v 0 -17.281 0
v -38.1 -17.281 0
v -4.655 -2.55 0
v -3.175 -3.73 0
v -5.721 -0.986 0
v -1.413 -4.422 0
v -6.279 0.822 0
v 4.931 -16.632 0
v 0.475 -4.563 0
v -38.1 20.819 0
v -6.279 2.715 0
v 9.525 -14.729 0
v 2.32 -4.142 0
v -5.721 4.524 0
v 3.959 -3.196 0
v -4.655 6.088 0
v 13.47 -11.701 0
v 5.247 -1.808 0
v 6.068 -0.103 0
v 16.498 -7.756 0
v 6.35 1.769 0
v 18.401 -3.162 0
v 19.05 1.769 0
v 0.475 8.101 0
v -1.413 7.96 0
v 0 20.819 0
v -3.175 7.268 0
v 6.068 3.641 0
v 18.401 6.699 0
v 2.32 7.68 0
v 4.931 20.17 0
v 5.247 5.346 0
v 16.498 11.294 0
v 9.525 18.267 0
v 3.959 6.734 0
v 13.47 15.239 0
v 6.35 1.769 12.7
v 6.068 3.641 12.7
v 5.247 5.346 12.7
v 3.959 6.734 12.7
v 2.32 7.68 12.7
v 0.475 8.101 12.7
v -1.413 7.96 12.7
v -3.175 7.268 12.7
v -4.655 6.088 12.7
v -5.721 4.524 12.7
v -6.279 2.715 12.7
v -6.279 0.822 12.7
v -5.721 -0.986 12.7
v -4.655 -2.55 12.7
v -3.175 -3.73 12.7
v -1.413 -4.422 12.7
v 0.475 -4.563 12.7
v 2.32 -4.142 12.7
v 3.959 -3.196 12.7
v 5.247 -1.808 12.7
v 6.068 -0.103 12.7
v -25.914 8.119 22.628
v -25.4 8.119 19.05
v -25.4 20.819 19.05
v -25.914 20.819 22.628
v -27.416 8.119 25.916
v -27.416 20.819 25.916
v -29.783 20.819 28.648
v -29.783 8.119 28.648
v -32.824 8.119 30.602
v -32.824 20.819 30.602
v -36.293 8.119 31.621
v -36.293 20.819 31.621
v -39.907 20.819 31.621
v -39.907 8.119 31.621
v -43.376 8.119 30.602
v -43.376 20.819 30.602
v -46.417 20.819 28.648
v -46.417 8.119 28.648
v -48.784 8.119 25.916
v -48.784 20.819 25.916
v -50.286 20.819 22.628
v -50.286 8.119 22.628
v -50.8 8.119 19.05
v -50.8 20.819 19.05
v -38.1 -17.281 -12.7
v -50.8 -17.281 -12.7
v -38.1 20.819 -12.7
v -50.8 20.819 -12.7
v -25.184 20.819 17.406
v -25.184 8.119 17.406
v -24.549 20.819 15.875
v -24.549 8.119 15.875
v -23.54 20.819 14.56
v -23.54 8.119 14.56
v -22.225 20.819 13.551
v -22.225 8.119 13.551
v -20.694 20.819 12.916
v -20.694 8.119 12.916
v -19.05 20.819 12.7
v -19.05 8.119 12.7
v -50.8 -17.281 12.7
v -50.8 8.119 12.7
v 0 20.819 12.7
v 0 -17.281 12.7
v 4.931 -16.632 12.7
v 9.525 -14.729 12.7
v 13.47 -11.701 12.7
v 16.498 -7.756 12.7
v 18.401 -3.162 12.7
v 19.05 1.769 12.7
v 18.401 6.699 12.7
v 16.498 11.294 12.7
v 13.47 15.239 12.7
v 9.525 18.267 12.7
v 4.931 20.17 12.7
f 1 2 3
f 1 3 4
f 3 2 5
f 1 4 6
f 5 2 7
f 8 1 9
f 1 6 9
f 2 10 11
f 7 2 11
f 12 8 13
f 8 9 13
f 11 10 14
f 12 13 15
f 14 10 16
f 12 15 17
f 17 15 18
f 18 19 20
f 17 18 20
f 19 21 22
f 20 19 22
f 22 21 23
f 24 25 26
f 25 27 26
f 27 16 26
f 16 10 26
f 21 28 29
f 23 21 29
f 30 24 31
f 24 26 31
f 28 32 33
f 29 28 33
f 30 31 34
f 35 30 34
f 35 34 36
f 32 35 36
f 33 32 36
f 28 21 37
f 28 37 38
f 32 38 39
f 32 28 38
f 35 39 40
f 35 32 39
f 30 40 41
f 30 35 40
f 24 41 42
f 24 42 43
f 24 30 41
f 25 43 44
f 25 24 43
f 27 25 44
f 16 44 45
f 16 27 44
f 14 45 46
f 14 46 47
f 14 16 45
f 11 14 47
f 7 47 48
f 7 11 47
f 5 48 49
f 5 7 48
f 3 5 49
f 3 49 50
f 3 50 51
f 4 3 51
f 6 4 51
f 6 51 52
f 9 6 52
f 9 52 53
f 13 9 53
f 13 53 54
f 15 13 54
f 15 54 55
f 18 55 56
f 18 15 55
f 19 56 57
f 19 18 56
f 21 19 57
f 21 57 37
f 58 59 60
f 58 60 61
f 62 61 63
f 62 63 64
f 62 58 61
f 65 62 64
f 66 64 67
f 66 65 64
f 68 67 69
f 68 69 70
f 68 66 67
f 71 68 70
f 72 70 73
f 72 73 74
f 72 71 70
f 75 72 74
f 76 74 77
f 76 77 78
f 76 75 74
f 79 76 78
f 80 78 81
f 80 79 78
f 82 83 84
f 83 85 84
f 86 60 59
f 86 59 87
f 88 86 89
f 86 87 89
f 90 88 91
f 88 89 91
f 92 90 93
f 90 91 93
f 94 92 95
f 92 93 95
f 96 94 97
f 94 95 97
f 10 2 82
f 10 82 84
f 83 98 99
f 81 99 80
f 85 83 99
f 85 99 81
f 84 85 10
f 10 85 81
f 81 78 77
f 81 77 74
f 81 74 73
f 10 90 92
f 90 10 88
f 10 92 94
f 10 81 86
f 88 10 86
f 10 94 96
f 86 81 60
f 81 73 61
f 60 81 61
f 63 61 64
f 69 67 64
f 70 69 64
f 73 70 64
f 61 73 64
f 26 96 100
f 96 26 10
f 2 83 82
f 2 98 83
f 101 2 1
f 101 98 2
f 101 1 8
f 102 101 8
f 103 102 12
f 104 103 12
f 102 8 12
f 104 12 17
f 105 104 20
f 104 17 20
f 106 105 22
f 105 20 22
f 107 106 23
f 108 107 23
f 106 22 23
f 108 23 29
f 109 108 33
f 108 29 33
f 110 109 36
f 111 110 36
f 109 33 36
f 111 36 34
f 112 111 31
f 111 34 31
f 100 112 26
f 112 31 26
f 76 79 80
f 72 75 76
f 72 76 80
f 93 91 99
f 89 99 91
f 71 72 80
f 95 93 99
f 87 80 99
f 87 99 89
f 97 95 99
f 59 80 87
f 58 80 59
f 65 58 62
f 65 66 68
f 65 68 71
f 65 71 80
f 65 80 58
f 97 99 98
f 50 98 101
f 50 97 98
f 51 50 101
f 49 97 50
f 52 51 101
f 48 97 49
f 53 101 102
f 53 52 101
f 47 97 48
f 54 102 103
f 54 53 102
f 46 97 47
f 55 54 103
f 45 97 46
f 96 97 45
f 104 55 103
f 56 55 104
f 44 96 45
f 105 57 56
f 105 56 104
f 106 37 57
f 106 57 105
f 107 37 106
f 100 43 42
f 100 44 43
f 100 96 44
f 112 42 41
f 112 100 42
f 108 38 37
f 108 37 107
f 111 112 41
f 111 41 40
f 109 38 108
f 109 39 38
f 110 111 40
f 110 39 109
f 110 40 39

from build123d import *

# Parameters (mm, degrees)
F0_R     = 6.35
F0_W     = 12.7
F0_H     = 25.4
F0_H_2   = 12.7
F1_DEPTH = 12.7
F2_DEPTH = 12.7
F3_DEPTH = 19.05
F4_DEPTH = 12.7
F6_DEPTH = 12.7
F7_R     = 6.34999


# Not quite as in the source:
# - a fillet or chamfer is up to 0.001 mm smaller than in the source, because OpenCascade refuses the exact size


with BuildPart() as f1:
    # F0 (on Top) → F1 (new body)
    with BuildSketch(Plane.XY):
        with BuildLine():
            ThreePointArc((0, -17.2810847643), (19.05, 1.7689152357), (0, 20.8189152357))
            Line((0, 20.8189152357), (-25.4, 20.8189152357))
            Line((-25.4, 20.8189152357), (-25.4, 8.1189152357))
            Line((-25.4, 8.1189152357), (-38.1, 8.1189152357))
            Line((-38.1, 8.1189152357), (-38.1, -17.2810847643))
            Line((-38.1, -17.2810847643), (0, -17.2810847643))
        make_face()
        with Locations((0, 1.7689152357)):
            Circle(F0_R, mode=Mode.SUBTRACT)
        with Locations((-44.45, -4.5810847643)):
            Rectangle(F0_W, F0_H)
        with Locations((-44.45, 14.4689152357)):
            Rectangle(F0_W, F0_H_2)
        with Locations((-31.75, 14.4689152357)):
            Rectangle(F0_W, F0_H_2)
    extrude(amount=F1_DEPTH)

    # F0 (on Top) → F2 (join)
    with BuildSketch(Plane.XY):
        with Locations((-44.45, -4.5810847643)):
            Rectangle(F0_W, F0_H)
        with Locations((-44.45, 14.4689152357)):
            Rectangle(F0_W, F0_H_2)
    extrude(amount=-F2_DEPTH)

    # F0 (on Top) → F3 (join)
    with BuildSketch(Plane.XY):
        with Locations((-31.75, 14.4689152357)):
            Rectangle(F0_W, F0_H_2)
    extrude(amount=F3_DEPTH)

    # F4 (add): a face of the model
    f4_faces = [f1.faces().sort_by_distance(p)[0] for p in [
        (-38.1, 14.4689152357, 15.875),
    ]]
    extrude(f4_faces, amount=F4_DEPTH)

    # F5 (on face) → F6 (join)
    with BuildSketch(Plane.XZ.offset(-8.1189152357)):
        with BuildLine():
            Line((-50.8, 19.05), (-25.4, 19.05))
            ThreePointArc((-25.4, 19.05), (-38.1, 31.75), (-50.8, 19.05))
        make_face()
    extrude(amount=-F6_DEPTH)

    # F7 (radius 6.35 in the source; OpenCascade refuses exactly that, so slightly less here)
    f7_edges = [f1.edges().sort_by_distance(p)[0] for p in [
        (-25.4, 14.468915, 12.7),
    ]]
    fillet(f7_edges, radius=F7_R)


solid = f1.part
